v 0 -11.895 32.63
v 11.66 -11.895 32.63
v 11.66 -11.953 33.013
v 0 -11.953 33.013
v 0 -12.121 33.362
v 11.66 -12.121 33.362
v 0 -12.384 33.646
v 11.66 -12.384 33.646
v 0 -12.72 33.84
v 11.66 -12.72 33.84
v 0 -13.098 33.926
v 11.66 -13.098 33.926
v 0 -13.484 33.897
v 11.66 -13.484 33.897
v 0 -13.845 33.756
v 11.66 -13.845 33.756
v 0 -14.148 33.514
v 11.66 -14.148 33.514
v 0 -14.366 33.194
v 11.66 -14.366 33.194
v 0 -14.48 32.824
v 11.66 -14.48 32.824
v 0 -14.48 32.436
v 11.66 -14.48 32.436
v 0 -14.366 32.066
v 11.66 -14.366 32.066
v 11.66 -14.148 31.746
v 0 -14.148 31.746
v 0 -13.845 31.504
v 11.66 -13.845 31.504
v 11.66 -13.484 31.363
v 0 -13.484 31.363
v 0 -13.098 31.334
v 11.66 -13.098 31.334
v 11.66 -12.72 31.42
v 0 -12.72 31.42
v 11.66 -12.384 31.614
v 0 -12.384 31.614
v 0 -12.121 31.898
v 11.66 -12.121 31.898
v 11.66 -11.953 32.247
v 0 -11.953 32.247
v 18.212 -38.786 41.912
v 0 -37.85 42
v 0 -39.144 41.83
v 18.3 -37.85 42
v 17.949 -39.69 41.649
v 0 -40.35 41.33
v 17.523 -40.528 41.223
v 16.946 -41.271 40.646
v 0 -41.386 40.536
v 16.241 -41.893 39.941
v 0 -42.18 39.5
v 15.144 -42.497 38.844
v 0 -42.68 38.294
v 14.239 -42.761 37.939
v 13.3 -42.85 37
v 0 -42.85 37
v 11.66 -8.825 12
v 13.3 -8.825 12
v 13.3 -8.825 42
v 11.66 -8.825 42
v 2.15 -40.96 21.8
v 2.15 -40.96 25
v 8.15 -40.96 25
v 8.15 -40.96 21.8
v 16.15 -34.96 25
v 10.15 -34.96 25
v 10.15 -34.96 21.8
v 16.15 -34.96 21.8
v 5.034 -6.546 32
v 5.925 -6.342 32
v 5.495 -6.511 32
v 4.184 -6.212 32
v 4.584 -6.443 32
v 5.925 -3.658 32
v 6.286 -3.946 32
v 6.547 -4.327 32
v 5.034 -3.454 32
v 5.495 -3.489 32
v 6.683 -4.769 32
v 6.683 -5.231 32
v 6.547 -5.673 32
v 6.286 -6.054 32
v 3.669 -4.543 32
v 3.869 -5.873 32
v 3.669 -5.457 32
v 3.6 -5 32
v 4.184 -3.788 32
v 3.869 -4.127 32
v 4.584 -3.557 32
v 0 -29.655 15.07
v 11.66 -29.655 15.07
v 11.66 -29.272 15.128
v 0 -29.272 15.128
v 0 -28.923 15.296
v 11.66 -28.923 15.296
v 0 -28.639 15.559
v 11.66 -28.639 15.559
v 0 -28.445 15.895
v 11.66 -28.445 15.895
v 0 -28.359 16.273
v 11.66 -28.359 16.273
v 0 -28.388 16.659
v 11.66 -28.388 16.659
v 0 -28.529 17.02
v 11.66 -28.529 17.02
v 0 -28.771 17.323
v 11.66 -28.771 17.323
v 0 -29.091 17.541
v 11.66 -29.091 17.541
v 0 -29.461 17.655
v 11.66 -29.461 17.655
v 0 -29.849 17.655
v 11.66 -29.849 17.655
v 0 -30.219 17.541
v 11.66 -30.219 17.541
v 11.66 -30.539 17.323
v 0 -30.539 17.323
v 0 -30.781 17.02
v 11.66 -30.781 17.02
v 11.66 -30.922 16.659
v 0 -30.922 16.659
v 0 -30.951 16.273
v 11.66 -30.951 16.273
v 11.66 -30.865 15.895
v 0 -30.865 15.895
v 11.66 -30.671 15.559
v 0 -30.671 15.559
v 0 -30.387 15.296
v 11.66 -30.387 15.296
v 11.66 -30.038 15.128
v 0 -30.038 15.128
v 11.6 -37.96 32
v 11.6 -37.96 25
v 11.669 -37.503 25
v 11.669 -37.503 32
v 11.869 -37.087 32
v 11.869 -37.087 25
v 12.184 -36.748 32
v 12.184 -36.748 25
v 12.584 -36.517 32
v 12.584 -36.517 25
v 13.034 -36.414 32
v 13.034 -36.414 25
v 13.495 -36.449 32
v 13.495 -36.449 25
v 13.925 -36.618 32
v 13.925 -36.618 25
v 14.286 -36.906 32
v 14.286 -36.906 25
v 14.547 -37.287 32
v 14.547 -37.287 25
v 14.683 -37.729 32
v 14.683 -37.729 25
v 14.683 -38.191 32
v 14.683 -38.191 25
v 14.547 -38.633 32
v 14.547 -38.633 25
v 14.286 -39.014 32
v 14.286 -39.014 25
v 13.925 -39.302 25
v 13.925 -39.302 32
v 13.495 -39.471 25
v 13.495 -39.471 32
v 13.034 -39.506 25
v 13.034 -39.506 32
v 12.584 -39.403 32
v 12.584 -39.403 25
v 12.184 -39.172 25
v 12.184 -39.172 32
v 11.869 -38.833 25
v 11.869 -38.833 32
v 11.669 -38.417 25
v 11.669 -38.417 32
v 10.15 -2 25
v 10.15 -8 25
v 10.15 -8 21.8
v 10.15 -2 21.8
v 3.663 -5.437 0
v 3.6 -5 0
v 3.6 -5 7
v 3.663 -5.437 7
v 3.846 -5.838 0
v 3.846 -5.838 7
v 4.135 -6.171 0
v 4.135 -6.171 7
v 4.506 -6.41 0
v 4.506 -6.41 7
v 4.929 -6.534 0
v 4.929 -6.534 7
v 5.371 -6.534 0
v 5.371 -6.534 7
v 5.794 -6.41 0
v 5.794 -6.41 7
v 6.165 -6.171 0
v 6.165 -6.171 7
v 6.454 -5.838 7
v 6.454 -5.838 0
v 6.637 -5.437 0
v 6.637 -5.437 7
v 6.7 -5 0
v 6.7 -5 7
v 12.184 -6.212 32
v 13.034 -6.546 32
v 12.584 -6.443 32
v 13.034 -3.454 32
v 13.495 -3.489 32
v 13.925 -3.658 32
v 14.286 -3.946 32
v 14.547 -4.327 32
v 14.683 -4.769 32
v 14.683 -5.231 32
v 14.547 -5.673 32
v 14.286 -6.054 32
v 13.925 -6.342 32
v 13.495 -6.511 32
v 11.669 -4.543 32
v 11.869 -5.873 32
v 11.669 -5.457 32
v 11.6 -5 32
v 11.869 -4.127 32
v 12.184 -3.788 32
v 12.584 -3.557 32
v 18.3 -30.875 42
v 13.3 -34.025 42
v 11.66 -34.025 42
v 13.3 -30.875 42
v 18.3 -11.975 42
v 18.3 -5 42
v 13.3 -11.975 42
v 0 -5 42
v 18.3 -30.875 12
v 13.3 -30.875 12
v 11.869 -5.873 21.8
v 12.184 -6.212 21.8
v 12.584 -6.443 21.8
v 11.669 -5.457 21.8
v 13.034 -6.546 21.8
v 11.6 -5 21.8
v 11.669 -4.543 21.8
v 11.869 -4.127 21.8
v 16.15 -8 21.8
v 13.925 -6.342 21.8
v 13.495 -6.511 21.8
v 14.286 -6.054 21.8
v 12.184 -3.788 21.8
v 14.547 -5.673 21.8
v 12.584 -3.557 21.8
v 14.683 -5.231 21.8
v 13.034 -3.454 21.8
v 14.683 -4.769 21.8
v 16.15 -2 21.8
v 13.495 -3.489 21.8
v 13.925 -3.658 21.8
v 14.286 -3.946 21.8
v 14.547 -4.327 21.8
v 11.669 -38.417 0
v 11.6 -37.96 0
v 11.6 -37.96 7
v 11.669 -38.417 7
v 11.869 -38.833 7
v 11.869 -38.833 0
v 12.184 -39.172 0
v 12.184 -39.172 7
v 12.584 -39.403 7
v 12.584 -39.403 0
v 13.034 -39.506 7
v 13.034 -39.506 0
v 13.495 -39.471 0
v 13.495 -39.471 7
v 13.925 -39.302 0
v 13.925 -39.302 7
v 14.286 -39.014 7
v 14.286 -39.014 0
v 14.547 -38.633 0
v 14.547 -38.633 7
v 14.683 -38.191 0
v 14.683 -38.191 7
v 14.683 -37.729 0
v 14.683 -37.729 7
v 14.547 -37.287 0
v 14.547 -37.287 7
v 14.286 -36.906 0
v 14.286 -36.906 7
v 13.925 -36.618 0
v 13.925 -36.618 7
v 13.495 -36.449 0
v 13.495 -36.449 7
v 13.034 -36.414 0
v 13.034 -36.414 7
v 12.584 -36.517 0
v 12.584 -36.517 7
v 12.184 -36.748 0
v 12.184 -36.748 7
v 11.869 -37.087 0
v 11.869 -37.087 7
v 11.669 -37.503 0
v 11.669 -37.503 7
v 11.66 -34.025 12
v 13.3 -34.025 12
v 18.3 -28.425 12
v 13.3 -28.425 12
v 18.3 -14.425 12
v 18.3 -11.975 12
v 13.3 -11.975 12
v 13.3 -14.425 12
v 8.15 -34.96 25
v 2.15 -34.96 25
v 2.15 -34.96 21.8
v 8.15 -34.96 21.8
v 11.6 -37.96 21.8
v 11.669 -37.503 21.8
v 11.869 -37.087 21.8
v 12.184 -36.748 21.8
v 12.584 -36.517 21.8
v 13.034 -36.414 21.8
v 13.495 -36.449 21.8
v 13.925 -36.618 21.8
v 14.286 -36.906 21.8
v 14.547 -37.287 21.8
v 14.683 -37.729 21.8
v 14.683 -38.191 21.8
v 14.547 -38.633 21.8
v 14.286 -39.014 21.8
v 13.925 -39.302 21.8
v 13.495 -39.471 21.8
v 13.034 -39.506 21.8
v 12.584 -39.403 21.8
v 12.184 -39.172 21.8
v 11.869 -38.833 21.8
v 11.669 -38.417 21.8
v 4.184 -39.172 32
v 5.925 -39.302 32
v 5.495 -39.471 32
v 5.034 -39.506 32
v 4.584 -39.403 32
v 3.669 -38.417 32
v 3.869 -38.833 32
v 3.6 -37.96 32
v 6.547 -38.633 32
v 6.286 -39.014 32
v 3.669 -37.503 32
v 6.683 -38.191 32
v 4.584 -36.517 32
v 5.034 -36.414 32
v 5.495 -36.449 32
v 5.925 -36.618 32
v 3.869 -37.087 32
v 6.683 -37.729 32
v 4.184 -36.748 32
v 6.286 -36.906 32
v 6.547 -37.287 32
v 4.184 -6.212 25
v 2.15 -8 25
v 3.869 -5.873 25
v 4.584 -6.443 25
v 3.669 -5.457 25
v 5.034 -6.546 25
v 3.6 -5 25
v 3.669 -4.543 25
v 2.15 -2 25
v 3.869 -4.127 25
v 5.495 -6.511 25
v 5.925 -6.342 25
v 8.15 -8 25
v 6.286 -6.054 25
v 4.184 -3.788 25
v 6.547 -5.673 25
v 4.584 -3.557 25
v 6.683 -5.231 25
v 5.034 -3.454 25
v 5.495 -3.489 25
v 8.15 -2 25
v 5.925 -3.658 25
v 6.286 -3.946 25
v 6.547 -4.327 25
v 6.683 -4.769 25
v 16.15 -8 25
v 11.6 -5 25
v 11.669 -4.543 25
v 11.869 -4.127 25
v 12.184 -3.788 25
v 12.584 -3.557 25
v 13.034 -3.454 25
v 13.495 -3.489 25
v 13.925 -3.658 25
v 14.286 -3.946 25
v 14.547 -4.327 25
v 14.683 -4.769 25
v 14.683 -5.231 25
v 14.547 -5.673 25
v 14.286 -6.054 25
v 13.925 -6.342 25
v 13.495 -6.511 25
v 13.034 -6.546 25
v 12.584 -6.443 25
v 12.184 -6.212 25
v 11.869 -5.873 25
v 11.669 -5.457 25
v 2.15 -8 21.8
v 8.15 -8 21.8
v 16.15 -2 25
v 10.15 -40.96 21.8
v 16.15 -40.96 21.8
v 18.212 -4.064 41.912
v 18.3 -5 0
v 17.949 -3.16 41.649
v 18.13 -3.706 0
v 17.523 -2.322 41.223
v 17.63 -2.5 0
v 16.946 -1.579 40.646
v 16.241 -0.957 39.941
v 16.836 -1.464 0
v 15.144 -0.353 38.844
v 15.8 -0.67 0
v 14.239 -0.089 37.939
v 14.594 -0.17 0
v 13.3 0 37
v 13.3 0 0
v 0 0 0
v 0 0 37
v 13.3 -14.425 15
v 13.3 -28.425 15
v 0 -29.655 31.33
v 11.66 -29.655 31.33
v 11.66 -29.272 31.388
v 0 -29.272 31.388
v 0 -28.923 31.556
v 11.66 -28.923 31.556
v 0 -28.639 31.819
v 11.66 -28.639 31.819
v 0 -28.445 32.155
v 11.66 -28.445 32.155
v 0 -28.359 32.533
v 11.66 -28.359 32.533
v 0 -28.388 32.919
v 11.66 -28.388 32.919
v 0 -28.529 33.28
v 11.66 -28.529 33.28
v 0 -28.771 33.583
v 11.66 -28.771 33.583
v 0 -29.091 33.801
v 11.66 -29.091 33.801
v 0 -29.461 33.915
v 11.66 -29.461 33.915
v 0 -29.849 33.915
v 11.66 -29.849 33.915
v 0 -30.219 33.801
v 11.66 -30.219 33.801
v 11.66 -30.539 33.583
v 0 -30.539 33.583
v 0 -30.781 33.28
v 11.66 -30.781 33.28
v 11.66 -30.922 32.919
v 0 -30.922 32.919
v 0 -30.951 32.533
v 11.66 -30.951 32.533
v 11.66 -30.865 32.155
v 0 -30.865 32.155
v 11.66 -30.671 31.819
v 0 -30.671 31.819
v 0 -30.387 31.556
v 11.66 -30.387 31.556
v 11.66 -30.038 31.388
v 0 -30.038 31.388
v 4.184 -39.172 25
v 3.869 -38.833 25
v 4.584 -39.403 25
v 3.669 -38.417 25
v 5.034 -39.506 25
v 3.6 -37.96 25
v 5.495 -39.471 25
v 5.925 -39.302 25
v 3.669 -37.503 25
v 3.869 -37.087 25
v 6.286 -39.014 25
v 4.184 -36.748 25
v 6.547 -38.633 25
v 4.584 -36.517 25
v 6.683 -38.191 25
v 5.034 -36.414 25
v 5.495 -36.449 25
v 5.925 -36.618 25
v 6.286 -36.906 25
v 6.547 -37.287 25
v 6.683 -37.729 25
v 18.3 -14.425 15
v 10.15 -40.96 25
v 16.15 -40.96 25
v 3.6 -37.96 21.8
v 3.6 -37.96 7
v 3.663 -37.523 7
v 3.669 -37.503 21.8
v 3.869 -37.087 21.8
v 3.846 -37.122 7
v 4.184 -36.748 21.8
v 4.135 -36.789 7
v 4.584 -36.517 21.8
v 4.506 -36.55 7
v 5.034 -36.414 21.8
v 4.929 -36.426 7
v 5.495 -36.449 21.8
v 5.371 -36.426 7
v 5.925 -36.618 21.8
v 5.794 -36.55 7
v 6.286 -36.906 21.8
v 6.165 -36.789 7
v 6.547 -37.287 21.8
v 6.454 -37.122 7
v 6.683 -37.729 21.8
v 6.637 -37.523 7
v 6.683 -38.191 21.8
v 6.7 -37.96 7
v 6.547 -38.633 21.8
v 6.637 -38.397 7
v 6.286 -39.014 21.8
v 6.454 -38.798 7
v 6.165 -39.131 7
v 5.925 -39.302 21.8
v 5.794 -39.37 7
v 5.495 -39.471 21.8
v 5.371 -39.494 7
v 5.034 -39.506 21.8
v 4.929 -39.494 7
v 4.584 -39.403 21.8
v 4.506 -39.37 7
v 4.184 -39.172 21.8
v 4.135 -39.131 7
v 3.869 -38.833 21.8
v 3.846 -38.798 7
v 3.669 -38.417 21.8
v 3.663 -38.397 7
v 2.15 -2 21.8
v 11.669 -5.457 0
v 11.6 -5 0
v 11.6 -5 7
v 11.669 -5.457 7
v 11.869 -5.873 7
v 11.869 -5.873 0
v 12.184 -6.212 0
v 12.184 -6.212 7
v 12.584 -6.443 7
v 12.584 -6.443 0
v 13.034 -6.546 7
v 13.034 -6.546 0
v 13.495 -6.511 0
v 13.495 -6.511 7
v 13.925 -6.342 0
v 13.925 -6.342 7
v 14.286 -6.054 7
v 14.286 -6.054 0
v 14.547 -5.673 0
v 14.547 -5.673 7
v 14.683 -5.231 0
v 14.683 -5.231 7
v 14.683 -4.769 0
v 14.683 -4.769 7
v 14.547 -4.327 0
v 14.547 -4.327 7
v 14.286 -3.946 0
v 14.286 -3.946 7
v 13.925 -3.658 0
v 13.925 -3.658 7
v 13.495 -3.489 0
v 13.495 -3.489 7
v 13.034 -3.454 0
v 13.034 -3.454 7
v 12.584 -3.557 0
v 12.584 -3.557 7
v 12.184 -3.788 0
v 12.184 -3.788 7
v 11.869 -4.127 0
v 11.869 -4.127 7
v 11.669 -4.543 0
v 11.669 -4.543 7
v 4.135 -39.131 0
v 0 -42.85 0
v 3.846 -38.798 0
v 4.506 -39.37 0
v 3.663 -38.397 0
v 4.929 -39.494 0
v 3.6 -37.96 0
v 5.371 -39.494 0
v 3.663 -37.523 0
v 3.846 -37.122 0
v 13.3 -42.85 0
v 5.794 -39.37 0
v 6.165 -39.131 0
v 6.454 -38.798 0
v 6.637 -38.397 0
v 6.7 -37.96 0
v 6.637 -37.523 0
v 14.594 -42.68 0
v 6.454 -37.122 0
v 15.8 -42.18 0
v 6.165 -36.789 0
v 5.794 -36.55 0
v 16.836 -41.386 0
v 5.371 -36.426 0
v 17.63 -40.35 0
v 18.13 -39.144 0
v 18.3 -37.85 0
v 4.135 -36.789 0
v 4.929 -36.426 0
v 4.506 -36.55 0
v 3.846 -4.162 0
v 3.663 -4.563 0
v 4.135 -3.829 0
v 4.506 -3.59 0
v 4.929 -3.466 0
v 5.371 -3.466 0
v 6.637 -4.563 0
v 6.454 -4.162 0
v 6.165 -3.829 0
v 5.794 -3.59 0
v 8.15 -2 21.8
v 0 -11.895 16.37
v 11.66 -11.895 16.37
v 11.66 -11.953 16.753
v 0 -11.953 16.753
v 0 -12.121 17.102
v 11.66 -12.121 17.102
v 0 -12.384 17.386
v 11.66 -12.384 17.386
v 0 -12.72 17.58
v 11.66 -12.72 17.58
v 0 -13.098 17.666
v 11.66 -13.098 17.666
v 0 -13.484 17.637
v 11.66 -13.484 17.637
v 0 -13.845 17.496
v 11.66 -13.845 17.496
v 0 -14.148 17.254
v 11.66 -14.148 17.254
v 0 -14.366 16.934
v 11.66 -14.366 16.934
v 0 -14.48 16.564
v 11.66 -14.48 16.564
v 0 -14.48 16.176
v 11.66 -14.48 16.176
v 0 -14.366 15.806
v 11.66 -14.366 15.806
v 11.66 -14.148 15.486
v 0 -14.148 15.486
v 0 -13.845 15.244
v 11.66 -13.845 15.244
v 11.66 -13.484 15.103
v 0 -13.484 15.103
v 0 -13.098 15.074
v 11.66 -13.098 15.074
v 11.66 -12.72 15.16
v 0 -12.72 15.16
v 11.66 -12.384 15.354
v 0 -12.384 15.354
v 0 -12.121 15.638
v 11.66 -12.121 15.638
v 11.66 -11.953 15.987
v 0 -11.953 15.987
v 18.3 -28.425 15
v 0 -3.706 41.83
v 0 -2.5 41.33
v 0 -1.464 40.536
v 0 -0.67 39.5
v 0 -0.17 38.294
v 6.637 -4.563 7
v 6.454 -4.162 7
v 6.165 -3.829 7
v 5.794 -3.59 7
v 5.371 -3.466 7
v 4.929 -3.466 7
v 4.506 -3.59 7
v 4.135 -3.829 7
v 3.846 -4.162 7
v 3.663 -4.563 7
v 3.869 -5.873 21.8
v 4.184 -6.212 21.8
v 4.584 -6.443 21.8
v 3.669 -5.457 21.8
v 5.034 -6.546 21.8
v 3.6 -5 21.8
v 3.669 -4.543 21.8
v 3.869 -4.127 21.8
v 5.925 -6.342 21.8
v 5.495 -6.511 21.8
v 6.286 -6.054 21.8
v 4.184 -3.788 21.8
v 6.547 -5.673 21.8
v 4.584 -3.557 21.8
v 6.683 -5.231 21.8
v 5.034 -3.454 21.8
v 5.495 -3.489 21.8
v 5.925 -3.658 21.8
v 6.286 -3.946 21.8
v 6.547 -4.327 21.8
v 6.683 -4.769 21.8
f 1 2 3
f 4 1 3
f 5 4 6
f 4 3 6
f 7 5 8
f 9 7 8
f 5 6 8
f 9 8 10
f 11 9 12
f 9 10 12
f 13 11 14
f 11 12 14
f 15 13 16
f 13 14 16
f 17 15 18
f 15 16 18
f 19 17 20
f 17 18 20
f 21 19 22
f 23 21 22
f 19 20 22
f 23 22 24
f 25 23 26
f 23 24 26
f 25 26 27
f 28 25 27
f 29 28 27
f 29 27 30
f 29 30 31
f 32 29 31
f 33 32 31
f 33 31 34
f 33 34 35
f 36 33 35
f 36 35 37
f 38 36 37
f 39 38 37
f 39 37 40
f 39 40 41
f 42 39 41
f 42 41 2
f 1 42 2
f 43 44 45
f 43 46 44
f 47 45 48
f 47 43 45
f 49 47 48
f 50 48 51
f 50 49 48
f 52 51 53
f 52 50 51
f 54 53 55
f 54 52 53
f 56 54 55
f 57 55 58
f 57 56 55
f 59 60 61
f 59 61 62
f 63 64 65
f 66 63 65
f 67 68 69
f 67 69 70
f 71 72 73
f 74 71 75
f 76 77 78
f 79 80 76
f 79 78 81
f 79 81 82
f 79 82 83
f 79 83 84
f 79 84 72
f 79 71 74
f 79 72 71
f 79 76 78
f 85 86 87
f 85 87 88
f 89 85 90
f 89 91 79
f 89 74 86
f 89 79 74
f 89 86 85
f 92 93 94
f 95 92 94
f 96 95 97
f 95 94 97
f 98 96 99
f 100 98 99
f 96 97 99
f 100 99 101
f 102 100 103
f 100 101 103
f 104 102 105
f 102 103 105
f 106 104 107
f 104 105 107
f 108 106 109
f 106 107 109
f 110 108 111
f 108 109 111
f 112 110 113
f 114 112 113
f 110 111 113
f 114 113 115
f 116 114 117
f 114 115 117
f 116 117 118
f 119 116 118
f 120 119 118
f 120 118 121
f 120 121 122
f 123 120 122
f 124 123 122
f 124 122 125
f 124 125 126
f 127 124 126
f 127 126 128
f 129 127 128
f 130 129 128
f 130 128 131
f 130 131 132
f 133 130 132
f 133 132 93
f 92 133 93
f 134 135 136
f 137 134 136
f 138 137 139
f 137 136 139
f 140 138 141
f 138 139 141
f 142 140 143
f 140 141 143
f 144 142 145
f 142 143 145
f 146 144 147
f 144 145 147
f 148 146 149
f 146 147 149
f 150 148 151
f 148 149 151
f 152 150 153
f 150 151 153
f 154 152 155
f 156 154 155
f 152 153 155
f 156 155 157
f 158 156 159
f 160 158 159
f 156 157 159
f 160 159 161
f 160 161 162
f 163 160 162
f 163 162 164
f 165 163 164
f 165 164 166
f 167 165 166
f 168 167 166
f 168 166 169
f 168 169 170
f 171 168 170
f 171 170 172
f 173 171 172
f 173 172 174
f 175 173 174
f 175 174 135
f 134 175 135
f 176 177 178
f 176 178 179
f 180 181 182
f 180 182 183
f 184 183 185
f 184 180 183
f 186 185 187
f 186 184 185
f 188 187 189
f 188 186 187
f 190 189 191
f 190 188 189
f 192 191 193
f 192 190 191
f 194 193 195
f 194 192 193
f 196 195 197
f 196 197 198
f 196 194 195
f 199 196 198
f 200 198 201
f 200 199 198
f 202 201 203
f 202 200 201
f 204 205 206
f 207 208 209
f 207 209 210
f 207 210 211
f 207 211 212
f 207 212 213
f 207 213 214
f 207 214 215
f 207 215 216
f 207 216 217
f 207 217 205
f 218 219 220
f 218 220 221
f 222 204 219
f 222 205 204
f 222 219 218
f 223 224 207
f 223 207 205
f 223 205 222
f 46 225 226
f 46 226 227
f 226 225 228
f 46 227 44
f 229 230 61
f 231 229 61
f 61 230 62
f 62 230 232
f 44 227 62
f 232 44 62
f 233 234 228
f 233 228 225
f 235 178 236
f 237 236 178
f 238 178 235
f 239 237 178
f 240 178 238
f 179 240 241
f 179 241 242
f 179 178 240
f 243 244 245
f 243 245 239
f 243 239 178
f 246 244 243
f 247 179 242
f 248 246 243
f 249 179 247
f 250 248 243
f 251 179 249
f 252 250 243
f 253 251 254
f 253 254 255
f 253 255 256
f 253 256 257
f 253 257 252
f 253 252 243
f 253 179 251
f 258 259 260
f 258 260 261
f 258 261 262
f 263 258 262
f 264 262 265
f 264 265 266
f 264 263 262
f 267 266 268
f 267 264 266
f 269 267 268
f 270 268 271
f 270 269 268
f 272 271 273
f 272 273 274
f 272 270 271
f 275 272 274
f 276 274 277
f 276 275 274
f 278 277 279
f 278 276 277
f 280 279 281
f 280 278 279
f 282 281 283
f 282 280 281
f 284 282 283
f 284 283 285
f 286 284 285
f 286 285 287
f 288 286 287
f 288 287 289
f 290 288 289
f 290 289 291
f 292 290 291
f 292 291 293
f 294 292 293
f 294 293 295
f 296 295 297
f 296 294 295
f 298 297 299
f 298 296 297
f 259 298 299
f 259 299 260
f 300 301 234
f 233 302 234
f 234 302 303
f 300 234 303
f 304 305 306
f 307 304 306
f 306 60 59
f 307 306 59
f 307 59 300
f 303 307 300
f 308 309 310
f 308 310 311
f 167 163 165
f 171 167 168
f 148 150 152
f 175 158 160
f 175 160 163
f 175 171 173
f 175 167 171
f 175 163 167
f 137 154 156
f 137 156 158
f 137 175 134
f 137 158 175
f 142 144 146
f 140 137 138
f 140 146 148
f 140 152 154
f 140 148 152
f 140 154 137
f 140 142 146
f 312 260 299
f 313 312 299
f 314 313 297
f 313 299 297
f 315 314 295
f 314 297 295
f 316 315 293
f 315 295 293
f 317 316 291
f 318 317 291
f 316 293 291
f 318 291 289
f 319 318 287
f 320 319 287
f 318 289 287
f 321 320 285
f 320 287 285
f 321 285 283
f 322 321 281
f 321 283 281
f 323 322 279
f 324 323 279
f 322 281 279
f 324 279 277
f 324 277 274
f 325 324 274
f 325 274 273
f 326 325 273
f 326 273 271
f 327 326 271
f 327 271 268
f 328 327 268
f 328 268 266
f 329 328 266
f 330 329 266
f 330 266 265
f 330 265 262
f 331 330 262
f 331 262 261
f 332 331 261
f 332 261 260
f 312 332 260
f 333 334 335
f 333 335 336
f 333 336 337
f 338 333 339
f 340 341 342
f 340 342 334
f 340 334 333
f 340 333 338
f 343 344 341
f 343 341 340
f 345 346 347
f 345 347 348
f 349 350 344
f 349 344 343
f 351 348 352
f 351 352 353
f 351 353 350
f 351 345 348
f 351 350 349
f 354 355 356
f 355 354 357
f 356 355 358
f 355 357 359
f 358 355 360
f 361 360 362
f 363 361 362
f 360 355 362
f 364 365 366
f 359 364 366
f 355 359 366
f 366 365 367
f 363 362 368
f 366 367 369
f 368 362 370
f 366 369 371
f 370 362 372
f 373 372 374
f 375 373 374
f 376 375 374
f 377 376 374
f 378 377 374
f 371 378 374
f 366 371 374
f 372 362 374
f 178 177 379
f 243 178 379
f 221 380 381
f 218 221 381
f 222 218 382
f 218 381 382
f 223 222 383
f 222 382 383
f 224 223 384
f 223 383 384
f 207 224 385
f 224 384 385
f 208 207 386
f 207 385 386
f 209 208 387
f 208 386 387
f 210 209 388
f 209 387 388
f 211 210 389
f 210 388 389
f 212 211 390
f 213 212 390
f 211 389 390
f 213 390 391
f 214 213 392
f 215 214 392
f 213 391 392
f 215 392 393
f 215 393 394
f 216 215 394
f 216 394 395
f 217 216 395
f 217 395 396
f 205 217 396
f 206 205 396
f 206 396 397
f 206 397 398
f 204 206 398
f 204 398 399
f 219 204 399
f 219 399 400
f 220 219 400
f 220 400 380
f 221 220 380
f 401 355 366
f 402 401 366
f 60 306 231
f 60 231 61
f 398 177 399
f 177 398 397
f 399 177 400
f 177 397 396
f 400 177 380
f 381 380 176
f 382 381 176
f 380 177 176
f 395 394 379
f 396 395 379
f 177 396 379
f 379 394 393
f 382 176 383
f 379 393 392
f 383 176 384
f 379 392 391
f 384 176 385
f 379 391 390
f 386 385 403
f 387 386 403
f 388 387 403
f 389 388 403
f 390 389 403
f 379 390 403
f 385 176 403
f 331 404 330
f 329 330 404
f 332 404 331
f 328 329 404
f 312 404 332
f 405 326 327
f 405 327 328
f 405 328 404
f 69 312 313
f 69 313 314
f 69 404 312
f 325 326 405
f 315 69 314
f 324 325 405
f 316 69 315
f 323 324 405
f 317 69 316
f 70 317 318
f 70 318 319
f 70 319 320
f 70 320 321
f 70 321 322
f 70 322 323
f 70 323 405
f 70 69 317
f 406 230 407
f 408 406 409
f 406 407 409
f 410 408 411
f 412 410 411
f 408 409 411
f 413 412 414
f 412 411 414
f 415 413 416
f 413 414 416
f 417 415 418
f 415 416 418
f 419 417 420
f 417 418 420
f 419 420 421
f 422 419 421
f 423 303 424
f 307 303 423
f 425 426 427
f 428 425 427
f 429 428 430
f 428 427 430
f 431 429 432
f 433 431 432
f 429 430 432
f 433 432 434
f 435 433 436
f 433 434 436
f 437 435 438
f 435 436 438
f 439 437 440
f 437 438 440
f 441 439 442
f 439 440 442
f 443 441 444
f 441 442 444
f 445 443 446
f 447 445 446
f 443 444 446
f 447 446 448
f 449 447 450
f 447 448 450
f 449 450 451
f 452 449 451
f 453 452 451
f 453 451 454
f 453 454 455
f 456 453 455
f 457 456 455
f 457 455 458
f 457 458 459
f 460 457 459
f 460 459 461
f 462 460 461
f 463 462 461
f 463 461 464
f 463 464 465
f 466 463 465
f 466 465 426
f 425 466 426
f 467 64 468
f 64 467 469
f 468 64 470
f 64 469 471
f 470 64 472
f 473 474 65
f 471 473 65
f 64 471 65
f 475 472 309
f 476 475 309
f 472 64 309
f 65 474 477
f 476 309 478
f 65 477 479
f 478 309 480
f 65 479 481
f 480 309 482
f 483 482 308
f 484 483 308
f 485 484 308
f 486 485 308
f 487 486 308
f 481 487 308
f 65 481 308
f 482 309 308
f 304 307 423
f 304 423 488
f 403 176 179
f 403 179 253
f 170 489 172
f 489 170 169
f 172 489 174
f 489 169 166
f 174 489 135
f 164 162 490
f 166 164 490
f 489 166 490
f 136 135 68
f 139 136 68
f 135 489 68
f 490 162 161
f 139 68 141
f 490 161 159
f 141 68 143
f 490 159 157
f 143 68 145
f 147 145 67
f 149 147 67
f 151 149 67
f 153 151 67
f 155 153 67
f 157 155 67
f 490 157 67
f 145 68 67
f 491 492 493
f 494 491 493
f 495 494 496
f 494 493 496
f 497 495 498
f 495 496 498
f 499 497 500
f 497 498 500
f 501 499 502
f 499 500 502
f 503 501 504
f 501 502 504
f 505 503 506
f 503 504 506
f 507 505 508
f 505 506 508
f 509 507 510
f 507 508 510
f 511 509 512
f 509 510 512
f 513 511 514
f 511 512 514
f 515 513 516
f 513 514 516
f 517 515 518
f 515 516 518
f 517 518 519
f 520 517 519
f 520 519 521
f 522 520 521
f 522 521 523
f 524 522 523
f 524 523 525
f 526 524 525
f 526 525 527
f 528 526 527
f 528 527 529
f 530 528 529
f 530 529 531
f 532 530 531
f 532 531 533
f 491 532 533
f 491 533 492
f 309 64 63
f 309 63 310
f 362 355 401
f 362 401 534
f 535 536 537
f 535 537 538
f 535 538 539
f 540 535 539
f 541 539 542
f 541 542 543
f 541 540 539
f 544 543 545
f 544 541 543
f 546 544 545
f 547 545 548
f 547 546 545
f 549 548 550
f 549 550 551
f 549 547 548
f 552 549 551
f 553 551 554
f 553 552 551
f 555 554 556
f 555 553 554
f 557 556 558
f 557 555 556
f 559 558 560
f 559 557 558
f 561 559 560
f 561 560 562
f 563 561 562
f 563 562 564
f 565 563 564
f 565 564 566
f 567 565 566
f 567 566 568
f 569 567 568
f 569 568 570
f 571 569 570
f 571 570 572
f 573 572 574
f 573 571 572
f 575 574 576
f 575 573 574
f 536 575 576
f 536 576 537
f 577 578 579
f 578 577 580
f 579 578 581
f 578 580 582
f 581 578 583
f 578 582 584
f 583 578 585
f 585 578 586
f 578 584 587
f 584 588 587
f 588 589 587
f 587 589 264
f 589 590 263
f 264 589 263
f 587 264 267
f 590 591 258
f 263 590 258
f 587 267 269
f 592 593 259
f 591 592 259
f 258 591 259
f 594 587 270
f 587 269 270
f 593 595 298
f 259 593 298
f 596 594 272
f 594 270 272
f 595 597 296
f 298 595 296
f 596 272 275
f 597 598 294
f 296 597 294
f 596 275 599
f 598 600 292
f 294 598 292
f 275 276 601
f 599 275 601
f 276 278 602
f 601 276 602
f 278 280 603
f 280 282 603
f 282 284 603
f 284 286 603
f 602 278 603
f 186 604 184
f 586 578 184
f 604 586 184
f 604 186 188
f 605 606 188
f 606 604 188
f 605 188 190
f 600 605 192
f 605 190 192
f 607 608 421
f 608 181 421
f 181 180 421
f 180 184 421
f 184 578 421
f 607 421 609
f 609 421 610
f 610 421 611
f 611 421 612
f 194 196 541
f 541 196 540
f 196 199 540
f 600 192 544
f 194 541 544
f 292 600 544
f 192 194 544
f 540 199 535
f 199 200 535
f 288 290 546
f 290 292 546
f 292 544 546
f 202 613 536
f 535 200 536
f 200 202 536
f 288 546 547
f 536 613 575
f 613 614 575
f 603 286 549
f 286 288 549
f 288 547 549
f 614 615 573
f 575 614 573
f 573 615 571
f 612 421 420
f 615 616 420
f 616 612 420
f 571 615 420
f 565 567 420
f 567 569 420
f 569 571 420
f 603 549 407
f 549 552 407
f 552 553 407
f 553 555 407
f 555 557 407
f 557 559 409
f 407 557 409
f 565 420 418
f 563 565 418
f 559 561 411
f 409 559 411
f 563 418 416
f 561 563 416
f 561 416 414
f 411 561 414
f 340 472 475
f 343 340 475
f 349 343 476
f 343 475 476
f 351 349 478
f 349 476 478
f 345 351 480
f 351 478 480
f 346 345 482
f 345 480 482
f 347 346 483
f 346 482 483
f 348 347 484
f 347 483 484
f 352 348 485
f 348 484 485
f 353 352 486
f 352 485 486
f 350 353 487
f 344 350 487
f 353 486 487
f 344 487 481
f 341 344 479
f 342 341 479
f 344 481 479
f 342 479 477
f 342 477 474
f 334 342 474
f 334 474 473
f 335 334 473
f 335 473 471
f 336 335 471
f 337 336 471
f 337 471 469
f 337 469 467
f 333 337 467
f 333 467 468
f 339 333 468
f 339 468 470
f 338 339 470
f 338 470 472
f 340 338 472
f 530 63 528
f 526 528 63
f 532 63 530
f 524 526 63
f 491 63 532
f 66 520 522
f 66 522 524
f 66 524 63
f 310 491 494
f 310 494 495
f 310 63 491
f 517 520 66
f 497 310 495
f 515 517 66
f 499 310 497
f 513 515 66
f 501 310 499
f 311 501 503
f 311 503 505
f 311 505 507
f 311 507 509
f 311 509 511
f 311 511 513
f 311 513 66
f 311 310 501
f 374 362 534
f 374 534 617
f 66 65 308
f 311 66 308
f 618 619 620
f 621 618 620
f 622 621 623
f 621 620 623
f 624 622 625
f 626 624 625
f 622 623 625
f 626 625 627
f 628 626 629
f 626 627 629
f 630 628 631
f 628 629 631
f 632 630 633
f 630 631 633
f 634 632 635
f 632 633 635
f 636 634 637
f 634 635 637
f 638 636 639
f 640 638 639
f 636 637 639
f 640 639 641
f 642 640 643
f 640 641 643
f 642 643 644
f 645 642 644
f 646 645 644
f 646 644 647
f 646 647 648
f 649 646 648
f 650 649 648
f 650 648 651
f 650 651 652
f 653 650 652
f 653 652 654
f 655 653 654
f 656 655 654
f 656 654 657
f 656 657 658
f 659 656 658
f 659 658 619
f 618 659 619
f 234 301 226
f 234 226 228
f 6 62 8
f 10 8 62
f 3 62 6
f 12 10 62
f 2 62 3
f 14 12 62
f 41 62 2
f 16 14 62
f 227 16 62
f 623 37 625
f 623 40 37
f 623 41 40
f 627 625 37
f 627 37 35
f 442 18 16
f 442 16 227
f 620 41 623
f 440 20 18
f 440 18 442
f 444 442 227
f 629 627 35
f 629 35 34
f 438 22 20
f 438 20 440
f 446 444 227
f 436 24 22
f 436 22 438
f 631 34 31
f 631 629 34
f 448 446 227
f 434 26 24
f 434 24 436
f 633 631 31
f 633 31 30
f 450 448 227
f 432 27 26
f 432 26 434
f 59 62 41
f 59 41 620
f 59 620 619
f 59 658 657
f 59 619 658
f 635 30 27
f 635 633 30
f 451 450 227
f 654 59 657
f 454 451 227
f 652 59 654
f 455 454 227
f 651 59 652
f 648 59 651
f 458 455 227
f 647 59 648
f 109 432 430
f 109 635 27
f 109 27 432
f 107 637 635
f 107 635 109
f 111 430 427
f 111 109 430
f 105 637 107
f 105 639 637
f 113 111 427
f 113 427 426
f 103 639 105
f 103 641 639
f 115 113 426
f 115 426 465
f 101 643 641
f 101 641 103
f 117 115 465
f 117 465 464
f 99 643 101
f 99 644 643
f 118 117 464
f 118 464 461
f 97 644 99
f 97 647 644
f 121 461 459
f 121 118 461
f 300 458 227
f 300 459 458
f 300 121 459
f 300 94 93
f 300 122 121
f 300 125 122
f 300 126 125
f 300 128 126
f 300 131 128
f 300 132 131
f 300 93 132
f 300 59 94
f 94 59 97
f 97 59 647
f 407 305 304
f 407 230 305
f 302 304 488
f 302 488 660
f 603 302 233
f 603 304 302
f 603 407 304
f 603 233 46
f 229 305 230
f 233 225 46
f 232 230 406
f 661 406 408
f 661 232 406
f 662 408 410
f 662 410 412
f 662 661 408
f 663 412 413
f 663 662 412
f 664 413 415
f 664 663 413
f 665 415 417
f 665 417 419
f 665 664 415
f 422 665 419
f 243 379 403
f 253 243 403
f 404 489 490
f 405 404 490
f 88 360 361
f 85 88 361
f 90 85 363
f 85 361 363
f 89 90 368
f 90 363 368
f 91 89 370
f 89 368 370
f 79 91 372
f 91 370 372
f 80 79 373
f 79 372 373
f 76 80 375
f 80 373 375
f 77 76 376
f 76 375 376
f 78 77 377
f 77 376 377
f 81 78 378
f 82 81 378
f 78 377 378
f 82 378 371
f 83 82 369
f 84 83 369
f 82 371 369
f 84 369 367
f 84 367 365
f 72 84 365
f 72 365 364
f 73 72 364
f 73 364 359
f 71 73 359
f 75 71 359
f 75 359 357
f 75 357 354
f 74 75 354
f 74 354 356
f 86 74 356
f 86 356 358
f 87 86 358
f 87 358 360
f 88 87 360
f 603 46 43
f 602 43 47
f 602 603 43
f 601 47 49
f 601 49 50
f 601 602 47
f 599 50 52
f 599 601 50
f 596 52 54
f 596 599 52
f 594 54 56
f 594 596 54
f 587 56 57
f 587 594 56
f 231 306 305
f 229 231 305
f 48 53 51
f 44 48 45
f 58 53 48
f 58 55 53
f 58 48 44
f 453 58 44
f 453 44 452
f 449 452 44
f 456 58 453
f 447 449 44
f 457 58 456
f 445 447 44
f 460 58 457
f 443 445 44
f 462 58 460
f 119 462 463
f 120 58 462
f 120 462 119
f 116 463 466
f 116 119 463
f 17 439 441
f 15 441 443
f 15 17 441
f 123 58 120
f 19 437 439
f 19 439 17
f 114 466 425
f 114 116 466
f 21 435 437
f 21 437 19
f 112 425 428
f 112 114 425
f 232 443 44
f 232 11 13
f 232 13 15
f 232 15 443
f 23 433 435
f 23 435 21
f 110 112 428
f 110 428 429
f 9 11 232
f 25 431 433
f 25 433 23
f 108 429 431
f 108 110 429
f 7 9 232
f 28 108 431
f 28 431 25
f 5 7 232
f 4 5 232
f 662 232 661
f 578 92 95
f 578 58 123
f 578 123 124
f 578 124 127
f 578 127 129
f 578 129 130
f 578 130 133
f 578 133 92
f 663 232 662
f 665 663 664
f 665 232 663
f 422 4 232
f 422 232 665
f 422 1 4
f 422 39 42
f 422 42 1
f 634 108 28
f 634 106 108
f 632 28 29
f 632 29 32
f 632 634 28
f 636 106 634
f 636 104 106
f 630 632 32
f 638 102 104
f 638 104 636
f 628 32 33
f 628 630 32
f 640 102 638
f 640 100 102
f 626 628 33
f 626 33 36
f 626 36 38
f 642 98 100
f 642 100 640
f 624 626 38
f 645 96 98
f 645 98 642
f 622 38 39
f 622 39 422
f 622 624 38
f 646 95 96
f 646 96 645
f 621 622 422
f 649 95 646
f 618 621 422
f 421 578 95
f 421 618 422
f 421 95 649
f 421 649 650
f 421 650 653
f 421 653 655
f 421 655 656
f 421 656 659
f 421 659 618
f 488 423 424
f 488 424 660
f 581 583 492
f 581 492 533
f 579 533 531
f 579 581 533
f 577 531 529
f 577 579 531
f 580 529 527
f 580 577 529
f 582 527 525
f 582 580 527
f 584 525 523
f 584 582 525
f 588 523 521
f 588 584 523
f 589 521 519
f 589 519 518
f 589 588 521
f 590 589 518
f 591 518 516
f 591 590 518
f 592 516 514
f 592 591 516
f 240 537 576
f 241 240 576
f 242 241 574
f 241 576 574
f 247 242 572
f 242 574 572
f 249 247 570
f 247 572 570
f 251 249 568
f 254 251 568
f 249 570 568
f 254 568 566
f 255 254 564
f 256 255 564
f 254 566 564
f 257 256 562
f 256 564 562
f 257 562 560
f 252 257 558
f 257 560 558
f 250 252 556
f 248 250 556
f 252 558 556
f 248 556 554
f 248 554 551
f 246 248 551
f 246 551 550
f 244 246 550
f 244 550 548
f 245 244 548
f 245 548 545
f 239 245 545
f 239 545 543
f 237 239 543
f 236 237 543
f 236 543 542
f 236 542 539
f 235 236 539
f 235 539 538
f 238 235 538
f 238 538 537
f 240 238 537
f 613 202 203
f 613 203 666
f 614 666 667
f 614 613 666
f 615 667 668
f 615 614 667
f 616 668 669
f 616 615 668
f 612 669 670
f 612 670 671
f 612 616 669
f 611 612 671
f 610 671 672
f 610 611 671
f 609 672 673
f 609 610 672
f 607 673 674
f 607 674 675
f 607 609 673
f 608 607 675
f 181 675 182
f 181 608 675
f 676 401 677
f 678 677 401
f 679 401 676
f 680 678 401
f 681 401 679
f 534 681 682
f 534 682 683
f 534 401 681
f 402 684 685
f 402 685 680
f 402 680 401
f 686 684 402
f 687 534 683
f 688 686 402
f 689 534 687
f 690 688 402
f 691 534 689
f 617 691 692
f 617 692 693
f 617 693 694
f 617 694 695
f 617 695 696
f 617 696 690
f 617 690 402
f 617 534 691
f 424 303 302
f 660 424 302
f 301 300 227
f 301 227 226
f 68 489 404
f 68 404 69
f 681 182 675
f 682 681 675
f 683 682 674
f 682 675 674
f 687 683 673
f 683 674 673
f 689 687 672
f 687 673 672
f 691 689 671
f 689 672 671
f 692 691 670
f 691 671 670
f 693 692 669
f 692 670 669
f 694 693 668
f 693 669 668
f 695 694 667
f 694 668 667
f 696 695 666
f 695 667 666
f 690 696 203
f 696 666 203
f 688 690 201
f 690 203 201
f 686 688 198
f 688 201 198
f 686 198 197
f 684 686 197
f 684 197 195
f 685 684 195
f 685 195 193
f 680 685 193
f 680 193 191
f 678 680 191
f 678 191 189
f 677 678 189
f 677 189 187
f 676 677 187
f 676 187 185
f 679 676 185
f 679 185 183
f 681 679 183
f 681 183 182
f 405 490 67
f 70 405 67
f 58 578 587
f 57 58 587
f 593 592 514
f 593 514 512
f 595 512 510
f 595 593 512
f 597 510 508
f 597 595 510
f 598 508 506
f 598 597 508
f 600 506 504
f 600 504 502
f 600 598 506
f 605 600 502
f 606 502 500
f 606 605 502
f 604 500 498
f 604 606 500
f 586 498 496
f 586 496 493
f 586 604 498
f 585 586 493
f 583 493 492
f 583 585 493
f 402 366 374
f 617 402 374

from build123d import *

# Parameters (mm, degrees)
SKETCH_1_W          = 18.3
SKETCH_1_H          = 42.85
SKETCH_1_R          = 1.55
EXTRUDE_1_DEPTH     = 7
SKETCH_2_W          = 5
SKETCH_2_H          = 14
EXTRUDE_4_DEPTH     = 8
SKETCH_5_W          = 5
SKETCH_5_H          = 3.15
EXTRUDE_5_DEPTH     = 35
EXTRUDE_7_DEPTH     = 35
EXTRUDE_8_DEPTH     = 5
CUT_EXTRUDE_1_REACH = 63.123
SKETCH_9_R          = 1.3
SKETCH_11_R         = 1.55
CUT_EXTRUDE_2_DEPTH = 32
SKETCH_12_W         = 6
SKETCH_12_H         = 6
CUT_EXTRUDE_3_DEPTH = 3.2
FILLET_1_R          = 5


with BuildPart() as part:
    # 草图1 → 凸台-拉伸1 (new body)
    with BuildSketch(Plane.XY):
        with Locations((9.15, -21.425)):
            Rectangle(SKETCH_1_W, SKETCH_1_H)
        with Locations((5.15, -5)):
            Circle(SKETCH_1_R, mode=Mode.SUBTRACT)
        with Locations((5.15, -37.96)):
            Circle(SKETCH_1_R, mode=Mode.SUBTRACT)
        with Locations(Location((13.15, -37.96, 0), (0, 0, 180))):
            Circle(SKETCH_1_R, mode=Mode.SUBTRACT)
        with Locations(Location((13.15, -5, 0), (0, 0, 180))):
            Circle(SKETCH_1_R, mode=Mode.SUBTRACT)
    extrude(amount=EXTRUDE_1_DEPTH)

    # 草图2 → 凸台-拉伸4 (add)
    with BuildSketch(Plane.XY.offset(7)):
        with Locations((15.8, -21.425)):
            Rectangle(SKETCH_2_W, SKETCH_2_H)
    extrude(amount=EXTRUDE_4_DEPTH)

    # 草图5 → 凸台-拉伸5 (add)
    with BuildSketch(Plane.XY.offset(7)):
        with Locations((15.8, -32.45)):
            Rectangle(SKETCH_5_W, SKETCH_5_H)
        with Locations((15.8, -10.4)):
            Rectangle(SKETCH_5_W, SKETCH_5_H)
    extrude(amount=EXTRUDE_5_DEPTH)

    # 草图7 → 凸台-拉伸7 (add)
    with BuildSketch(Plane.XY.offset(7)):
        Polygon((0, 0), (12.7, 0), (18.3, 0), (18.3, -8.825), (11.66, -8.825), (11.66, -34.025), (18.3, -34.025), (18.3, -42.85), (12.7, -42.85), (0, -42.85), align=None)
    extrude(amount=EXTRUDE_7_DEPTH)

    # 草图8 → 凸台-拉伸8 (add)
    with BuildSketch(Plane.XY.offset(7)):
        Polygon((13.3, -30.875), (13.3, -34.025), (11.66, -34.025), (11.66, -8.825), (13.3, -8.825), (13.3, -11.975), (18.3, -11.975), (18.3, -14.425), (13.3, -14.425), (13.3, -28.425), (18.3, -28.425), (18.3, -30.875), align=None)
    extrude(amount=EXTRUDE_8_DEPTH)

    # 草图9 → 切除-拉伸1 (cut, up to next)
    with BuildSketch(Plane(origin=(11.66, 0, 0), x_dir=(0, 0, -1), z_dir=(1, 0, 0)), mode=Mode.PRIVATE) as cut_extrude_1_sk1:
        with Locations(Location((-16.37, -13.195, 0), (0, 0, 90))):
            Circle(SKETCH_9_R)
    cut_extrude_1_tool1 = extrude(cut_extrude_1_sk1.sketch, amount=-CUT_EXTRUDE_1_REACH, mode=Mode.PRIVATE) & part.part
    # 草图9 → 切除-拉伸1 (cut, up to next)
    with BuildSketch(Plane(origin=(11.66, 0, 0), x_dir=(0, 0, -1), z_dir=(1, 0, 0)), mode=Mode.PRIVATE) as cut_extrude_1_sk2:
        with Locations((-16.37, -29.655)):
            Circle(SKETCH_9_R)
    cut_extrude_1_tool2 = extrude(cut_extrude_1_sk2.sketch, amount=-CUT_EXTRUDE_1_REACH, mode=Mode.PRIVATE) & part.part
    # 草图9 → 切除-拉伸1 (cut, up to next)
    with BuildSketch(Plane(origin=(11.66, 0, 0), x_dir=(0, 0, -1), z_dir=(1, 0, 0)), mode=Mode.PRIVATE) as cut_extrude_1_sk3:
        with Locations(Location((-32.63, -13.195, 0), (0, 0, 90))):
            Circle(SKETCH_9_R)
    cut_extrude_1_tool3 = extrude(cut_extrude_1_sk3.sketch, amount=-CUT_EXTRUDE_1_REACH, mode=Mode.PRIVATE) & part.part
    # 草图9 → 切除-拉伸1 (cut, up to next)
    with BuildSketch(Plane(origin=(11.66, 0, 0), x_dir=(0, 0, -1), z_dir=(1, 0, 0)), mode=Mode.PRIVATE) as cut_extrude_1_sk4:
        with Locations((-32.63, -29.655)):
            Circle(SKETCH_9_R)
    cut_extrude_1_tool4 = extrude(cut_extrude_1_sk4.sketch, amount=-CUT_EXTRUDE_1_REACH, mode=Mode.PRIVATE) & part.part
    add(cut_extrude_1_tool1.solids().sort_by_distance((11.66, -13.195, 16.37))[0], mode=Mode.SUBTRACT)
    add(cut_extrude_1_tool2.solids().sort_by_distance((11.66, -29.655, 16.37))[0], mode=Mode.SUBTRACT)
    add(cut_extrude_1_tool3.solids().sort_by_distance((11.66, -13.195, 32.63))[0], mode=Mode.SUBTRACT)
    add(cut_extrude_1_tool4.solids().sort_by_distance((11.66, -29.655, 32.63))[0], mode=Mode.SUBTRACT)

    # 草图11 → 切除-拉伸2 (cut)
    with BuildSketch(Plane(origin=(0, 0, 0), x_dir=(-1, 0, 0), z_dir=(0, 0, -1))):
        with Locations((-13.15, -5)):
            Circle(SKETCH_11_R)
        with Locations((-5.15, -5)):
            Circle(SKETCH_11_R)
        with Locations((-5.15, -37.96)):
            Circle(SKETCH_11_R)
        with Locations((-13.15, -37.96)):
            Circle(SKETCH_11_R)
    extrude(amount=-CUT_EXTRUDE_2_DEPTH, mode=Mode.SUBTRACT)

    # 草图12 → 切除-拉伸3 (cut)
    with BuildSketch(Plane.XY.offset(25)):
        with Locations((13.15, -5)):
            Rectangle(SKETCH_12_W, SKETCH_12_H)
        with Locations((5.15, -5)):
            Rectangle(SKETCH_12_W, SKETCH_12_H)
        with Locations((13.15, -37.96)):
            Rectangle(SKETCH_12_W, SKETCH_12_H)
        with Locations((5.15, -37.96)):
            Rectangle(SKETCH_12_W, SKETCH_12_H)
    extrude(amount=-CUT_EXTRUDE_3_DEPTH, mode=Mode.SUBTRACT)

    # 圆角1
    fillet_1_edges = [part.edges().sort_by_distance(p)[0] for p in [
        (9.15, -42.85, 42),
        (18.3, 0, 21),
        (18.3, -42.85, 21),
        (9.15, 0, 42),
    ]]
    fillet(fillet_1_edges, radius=FILLET_1_R)


solid = part.part
